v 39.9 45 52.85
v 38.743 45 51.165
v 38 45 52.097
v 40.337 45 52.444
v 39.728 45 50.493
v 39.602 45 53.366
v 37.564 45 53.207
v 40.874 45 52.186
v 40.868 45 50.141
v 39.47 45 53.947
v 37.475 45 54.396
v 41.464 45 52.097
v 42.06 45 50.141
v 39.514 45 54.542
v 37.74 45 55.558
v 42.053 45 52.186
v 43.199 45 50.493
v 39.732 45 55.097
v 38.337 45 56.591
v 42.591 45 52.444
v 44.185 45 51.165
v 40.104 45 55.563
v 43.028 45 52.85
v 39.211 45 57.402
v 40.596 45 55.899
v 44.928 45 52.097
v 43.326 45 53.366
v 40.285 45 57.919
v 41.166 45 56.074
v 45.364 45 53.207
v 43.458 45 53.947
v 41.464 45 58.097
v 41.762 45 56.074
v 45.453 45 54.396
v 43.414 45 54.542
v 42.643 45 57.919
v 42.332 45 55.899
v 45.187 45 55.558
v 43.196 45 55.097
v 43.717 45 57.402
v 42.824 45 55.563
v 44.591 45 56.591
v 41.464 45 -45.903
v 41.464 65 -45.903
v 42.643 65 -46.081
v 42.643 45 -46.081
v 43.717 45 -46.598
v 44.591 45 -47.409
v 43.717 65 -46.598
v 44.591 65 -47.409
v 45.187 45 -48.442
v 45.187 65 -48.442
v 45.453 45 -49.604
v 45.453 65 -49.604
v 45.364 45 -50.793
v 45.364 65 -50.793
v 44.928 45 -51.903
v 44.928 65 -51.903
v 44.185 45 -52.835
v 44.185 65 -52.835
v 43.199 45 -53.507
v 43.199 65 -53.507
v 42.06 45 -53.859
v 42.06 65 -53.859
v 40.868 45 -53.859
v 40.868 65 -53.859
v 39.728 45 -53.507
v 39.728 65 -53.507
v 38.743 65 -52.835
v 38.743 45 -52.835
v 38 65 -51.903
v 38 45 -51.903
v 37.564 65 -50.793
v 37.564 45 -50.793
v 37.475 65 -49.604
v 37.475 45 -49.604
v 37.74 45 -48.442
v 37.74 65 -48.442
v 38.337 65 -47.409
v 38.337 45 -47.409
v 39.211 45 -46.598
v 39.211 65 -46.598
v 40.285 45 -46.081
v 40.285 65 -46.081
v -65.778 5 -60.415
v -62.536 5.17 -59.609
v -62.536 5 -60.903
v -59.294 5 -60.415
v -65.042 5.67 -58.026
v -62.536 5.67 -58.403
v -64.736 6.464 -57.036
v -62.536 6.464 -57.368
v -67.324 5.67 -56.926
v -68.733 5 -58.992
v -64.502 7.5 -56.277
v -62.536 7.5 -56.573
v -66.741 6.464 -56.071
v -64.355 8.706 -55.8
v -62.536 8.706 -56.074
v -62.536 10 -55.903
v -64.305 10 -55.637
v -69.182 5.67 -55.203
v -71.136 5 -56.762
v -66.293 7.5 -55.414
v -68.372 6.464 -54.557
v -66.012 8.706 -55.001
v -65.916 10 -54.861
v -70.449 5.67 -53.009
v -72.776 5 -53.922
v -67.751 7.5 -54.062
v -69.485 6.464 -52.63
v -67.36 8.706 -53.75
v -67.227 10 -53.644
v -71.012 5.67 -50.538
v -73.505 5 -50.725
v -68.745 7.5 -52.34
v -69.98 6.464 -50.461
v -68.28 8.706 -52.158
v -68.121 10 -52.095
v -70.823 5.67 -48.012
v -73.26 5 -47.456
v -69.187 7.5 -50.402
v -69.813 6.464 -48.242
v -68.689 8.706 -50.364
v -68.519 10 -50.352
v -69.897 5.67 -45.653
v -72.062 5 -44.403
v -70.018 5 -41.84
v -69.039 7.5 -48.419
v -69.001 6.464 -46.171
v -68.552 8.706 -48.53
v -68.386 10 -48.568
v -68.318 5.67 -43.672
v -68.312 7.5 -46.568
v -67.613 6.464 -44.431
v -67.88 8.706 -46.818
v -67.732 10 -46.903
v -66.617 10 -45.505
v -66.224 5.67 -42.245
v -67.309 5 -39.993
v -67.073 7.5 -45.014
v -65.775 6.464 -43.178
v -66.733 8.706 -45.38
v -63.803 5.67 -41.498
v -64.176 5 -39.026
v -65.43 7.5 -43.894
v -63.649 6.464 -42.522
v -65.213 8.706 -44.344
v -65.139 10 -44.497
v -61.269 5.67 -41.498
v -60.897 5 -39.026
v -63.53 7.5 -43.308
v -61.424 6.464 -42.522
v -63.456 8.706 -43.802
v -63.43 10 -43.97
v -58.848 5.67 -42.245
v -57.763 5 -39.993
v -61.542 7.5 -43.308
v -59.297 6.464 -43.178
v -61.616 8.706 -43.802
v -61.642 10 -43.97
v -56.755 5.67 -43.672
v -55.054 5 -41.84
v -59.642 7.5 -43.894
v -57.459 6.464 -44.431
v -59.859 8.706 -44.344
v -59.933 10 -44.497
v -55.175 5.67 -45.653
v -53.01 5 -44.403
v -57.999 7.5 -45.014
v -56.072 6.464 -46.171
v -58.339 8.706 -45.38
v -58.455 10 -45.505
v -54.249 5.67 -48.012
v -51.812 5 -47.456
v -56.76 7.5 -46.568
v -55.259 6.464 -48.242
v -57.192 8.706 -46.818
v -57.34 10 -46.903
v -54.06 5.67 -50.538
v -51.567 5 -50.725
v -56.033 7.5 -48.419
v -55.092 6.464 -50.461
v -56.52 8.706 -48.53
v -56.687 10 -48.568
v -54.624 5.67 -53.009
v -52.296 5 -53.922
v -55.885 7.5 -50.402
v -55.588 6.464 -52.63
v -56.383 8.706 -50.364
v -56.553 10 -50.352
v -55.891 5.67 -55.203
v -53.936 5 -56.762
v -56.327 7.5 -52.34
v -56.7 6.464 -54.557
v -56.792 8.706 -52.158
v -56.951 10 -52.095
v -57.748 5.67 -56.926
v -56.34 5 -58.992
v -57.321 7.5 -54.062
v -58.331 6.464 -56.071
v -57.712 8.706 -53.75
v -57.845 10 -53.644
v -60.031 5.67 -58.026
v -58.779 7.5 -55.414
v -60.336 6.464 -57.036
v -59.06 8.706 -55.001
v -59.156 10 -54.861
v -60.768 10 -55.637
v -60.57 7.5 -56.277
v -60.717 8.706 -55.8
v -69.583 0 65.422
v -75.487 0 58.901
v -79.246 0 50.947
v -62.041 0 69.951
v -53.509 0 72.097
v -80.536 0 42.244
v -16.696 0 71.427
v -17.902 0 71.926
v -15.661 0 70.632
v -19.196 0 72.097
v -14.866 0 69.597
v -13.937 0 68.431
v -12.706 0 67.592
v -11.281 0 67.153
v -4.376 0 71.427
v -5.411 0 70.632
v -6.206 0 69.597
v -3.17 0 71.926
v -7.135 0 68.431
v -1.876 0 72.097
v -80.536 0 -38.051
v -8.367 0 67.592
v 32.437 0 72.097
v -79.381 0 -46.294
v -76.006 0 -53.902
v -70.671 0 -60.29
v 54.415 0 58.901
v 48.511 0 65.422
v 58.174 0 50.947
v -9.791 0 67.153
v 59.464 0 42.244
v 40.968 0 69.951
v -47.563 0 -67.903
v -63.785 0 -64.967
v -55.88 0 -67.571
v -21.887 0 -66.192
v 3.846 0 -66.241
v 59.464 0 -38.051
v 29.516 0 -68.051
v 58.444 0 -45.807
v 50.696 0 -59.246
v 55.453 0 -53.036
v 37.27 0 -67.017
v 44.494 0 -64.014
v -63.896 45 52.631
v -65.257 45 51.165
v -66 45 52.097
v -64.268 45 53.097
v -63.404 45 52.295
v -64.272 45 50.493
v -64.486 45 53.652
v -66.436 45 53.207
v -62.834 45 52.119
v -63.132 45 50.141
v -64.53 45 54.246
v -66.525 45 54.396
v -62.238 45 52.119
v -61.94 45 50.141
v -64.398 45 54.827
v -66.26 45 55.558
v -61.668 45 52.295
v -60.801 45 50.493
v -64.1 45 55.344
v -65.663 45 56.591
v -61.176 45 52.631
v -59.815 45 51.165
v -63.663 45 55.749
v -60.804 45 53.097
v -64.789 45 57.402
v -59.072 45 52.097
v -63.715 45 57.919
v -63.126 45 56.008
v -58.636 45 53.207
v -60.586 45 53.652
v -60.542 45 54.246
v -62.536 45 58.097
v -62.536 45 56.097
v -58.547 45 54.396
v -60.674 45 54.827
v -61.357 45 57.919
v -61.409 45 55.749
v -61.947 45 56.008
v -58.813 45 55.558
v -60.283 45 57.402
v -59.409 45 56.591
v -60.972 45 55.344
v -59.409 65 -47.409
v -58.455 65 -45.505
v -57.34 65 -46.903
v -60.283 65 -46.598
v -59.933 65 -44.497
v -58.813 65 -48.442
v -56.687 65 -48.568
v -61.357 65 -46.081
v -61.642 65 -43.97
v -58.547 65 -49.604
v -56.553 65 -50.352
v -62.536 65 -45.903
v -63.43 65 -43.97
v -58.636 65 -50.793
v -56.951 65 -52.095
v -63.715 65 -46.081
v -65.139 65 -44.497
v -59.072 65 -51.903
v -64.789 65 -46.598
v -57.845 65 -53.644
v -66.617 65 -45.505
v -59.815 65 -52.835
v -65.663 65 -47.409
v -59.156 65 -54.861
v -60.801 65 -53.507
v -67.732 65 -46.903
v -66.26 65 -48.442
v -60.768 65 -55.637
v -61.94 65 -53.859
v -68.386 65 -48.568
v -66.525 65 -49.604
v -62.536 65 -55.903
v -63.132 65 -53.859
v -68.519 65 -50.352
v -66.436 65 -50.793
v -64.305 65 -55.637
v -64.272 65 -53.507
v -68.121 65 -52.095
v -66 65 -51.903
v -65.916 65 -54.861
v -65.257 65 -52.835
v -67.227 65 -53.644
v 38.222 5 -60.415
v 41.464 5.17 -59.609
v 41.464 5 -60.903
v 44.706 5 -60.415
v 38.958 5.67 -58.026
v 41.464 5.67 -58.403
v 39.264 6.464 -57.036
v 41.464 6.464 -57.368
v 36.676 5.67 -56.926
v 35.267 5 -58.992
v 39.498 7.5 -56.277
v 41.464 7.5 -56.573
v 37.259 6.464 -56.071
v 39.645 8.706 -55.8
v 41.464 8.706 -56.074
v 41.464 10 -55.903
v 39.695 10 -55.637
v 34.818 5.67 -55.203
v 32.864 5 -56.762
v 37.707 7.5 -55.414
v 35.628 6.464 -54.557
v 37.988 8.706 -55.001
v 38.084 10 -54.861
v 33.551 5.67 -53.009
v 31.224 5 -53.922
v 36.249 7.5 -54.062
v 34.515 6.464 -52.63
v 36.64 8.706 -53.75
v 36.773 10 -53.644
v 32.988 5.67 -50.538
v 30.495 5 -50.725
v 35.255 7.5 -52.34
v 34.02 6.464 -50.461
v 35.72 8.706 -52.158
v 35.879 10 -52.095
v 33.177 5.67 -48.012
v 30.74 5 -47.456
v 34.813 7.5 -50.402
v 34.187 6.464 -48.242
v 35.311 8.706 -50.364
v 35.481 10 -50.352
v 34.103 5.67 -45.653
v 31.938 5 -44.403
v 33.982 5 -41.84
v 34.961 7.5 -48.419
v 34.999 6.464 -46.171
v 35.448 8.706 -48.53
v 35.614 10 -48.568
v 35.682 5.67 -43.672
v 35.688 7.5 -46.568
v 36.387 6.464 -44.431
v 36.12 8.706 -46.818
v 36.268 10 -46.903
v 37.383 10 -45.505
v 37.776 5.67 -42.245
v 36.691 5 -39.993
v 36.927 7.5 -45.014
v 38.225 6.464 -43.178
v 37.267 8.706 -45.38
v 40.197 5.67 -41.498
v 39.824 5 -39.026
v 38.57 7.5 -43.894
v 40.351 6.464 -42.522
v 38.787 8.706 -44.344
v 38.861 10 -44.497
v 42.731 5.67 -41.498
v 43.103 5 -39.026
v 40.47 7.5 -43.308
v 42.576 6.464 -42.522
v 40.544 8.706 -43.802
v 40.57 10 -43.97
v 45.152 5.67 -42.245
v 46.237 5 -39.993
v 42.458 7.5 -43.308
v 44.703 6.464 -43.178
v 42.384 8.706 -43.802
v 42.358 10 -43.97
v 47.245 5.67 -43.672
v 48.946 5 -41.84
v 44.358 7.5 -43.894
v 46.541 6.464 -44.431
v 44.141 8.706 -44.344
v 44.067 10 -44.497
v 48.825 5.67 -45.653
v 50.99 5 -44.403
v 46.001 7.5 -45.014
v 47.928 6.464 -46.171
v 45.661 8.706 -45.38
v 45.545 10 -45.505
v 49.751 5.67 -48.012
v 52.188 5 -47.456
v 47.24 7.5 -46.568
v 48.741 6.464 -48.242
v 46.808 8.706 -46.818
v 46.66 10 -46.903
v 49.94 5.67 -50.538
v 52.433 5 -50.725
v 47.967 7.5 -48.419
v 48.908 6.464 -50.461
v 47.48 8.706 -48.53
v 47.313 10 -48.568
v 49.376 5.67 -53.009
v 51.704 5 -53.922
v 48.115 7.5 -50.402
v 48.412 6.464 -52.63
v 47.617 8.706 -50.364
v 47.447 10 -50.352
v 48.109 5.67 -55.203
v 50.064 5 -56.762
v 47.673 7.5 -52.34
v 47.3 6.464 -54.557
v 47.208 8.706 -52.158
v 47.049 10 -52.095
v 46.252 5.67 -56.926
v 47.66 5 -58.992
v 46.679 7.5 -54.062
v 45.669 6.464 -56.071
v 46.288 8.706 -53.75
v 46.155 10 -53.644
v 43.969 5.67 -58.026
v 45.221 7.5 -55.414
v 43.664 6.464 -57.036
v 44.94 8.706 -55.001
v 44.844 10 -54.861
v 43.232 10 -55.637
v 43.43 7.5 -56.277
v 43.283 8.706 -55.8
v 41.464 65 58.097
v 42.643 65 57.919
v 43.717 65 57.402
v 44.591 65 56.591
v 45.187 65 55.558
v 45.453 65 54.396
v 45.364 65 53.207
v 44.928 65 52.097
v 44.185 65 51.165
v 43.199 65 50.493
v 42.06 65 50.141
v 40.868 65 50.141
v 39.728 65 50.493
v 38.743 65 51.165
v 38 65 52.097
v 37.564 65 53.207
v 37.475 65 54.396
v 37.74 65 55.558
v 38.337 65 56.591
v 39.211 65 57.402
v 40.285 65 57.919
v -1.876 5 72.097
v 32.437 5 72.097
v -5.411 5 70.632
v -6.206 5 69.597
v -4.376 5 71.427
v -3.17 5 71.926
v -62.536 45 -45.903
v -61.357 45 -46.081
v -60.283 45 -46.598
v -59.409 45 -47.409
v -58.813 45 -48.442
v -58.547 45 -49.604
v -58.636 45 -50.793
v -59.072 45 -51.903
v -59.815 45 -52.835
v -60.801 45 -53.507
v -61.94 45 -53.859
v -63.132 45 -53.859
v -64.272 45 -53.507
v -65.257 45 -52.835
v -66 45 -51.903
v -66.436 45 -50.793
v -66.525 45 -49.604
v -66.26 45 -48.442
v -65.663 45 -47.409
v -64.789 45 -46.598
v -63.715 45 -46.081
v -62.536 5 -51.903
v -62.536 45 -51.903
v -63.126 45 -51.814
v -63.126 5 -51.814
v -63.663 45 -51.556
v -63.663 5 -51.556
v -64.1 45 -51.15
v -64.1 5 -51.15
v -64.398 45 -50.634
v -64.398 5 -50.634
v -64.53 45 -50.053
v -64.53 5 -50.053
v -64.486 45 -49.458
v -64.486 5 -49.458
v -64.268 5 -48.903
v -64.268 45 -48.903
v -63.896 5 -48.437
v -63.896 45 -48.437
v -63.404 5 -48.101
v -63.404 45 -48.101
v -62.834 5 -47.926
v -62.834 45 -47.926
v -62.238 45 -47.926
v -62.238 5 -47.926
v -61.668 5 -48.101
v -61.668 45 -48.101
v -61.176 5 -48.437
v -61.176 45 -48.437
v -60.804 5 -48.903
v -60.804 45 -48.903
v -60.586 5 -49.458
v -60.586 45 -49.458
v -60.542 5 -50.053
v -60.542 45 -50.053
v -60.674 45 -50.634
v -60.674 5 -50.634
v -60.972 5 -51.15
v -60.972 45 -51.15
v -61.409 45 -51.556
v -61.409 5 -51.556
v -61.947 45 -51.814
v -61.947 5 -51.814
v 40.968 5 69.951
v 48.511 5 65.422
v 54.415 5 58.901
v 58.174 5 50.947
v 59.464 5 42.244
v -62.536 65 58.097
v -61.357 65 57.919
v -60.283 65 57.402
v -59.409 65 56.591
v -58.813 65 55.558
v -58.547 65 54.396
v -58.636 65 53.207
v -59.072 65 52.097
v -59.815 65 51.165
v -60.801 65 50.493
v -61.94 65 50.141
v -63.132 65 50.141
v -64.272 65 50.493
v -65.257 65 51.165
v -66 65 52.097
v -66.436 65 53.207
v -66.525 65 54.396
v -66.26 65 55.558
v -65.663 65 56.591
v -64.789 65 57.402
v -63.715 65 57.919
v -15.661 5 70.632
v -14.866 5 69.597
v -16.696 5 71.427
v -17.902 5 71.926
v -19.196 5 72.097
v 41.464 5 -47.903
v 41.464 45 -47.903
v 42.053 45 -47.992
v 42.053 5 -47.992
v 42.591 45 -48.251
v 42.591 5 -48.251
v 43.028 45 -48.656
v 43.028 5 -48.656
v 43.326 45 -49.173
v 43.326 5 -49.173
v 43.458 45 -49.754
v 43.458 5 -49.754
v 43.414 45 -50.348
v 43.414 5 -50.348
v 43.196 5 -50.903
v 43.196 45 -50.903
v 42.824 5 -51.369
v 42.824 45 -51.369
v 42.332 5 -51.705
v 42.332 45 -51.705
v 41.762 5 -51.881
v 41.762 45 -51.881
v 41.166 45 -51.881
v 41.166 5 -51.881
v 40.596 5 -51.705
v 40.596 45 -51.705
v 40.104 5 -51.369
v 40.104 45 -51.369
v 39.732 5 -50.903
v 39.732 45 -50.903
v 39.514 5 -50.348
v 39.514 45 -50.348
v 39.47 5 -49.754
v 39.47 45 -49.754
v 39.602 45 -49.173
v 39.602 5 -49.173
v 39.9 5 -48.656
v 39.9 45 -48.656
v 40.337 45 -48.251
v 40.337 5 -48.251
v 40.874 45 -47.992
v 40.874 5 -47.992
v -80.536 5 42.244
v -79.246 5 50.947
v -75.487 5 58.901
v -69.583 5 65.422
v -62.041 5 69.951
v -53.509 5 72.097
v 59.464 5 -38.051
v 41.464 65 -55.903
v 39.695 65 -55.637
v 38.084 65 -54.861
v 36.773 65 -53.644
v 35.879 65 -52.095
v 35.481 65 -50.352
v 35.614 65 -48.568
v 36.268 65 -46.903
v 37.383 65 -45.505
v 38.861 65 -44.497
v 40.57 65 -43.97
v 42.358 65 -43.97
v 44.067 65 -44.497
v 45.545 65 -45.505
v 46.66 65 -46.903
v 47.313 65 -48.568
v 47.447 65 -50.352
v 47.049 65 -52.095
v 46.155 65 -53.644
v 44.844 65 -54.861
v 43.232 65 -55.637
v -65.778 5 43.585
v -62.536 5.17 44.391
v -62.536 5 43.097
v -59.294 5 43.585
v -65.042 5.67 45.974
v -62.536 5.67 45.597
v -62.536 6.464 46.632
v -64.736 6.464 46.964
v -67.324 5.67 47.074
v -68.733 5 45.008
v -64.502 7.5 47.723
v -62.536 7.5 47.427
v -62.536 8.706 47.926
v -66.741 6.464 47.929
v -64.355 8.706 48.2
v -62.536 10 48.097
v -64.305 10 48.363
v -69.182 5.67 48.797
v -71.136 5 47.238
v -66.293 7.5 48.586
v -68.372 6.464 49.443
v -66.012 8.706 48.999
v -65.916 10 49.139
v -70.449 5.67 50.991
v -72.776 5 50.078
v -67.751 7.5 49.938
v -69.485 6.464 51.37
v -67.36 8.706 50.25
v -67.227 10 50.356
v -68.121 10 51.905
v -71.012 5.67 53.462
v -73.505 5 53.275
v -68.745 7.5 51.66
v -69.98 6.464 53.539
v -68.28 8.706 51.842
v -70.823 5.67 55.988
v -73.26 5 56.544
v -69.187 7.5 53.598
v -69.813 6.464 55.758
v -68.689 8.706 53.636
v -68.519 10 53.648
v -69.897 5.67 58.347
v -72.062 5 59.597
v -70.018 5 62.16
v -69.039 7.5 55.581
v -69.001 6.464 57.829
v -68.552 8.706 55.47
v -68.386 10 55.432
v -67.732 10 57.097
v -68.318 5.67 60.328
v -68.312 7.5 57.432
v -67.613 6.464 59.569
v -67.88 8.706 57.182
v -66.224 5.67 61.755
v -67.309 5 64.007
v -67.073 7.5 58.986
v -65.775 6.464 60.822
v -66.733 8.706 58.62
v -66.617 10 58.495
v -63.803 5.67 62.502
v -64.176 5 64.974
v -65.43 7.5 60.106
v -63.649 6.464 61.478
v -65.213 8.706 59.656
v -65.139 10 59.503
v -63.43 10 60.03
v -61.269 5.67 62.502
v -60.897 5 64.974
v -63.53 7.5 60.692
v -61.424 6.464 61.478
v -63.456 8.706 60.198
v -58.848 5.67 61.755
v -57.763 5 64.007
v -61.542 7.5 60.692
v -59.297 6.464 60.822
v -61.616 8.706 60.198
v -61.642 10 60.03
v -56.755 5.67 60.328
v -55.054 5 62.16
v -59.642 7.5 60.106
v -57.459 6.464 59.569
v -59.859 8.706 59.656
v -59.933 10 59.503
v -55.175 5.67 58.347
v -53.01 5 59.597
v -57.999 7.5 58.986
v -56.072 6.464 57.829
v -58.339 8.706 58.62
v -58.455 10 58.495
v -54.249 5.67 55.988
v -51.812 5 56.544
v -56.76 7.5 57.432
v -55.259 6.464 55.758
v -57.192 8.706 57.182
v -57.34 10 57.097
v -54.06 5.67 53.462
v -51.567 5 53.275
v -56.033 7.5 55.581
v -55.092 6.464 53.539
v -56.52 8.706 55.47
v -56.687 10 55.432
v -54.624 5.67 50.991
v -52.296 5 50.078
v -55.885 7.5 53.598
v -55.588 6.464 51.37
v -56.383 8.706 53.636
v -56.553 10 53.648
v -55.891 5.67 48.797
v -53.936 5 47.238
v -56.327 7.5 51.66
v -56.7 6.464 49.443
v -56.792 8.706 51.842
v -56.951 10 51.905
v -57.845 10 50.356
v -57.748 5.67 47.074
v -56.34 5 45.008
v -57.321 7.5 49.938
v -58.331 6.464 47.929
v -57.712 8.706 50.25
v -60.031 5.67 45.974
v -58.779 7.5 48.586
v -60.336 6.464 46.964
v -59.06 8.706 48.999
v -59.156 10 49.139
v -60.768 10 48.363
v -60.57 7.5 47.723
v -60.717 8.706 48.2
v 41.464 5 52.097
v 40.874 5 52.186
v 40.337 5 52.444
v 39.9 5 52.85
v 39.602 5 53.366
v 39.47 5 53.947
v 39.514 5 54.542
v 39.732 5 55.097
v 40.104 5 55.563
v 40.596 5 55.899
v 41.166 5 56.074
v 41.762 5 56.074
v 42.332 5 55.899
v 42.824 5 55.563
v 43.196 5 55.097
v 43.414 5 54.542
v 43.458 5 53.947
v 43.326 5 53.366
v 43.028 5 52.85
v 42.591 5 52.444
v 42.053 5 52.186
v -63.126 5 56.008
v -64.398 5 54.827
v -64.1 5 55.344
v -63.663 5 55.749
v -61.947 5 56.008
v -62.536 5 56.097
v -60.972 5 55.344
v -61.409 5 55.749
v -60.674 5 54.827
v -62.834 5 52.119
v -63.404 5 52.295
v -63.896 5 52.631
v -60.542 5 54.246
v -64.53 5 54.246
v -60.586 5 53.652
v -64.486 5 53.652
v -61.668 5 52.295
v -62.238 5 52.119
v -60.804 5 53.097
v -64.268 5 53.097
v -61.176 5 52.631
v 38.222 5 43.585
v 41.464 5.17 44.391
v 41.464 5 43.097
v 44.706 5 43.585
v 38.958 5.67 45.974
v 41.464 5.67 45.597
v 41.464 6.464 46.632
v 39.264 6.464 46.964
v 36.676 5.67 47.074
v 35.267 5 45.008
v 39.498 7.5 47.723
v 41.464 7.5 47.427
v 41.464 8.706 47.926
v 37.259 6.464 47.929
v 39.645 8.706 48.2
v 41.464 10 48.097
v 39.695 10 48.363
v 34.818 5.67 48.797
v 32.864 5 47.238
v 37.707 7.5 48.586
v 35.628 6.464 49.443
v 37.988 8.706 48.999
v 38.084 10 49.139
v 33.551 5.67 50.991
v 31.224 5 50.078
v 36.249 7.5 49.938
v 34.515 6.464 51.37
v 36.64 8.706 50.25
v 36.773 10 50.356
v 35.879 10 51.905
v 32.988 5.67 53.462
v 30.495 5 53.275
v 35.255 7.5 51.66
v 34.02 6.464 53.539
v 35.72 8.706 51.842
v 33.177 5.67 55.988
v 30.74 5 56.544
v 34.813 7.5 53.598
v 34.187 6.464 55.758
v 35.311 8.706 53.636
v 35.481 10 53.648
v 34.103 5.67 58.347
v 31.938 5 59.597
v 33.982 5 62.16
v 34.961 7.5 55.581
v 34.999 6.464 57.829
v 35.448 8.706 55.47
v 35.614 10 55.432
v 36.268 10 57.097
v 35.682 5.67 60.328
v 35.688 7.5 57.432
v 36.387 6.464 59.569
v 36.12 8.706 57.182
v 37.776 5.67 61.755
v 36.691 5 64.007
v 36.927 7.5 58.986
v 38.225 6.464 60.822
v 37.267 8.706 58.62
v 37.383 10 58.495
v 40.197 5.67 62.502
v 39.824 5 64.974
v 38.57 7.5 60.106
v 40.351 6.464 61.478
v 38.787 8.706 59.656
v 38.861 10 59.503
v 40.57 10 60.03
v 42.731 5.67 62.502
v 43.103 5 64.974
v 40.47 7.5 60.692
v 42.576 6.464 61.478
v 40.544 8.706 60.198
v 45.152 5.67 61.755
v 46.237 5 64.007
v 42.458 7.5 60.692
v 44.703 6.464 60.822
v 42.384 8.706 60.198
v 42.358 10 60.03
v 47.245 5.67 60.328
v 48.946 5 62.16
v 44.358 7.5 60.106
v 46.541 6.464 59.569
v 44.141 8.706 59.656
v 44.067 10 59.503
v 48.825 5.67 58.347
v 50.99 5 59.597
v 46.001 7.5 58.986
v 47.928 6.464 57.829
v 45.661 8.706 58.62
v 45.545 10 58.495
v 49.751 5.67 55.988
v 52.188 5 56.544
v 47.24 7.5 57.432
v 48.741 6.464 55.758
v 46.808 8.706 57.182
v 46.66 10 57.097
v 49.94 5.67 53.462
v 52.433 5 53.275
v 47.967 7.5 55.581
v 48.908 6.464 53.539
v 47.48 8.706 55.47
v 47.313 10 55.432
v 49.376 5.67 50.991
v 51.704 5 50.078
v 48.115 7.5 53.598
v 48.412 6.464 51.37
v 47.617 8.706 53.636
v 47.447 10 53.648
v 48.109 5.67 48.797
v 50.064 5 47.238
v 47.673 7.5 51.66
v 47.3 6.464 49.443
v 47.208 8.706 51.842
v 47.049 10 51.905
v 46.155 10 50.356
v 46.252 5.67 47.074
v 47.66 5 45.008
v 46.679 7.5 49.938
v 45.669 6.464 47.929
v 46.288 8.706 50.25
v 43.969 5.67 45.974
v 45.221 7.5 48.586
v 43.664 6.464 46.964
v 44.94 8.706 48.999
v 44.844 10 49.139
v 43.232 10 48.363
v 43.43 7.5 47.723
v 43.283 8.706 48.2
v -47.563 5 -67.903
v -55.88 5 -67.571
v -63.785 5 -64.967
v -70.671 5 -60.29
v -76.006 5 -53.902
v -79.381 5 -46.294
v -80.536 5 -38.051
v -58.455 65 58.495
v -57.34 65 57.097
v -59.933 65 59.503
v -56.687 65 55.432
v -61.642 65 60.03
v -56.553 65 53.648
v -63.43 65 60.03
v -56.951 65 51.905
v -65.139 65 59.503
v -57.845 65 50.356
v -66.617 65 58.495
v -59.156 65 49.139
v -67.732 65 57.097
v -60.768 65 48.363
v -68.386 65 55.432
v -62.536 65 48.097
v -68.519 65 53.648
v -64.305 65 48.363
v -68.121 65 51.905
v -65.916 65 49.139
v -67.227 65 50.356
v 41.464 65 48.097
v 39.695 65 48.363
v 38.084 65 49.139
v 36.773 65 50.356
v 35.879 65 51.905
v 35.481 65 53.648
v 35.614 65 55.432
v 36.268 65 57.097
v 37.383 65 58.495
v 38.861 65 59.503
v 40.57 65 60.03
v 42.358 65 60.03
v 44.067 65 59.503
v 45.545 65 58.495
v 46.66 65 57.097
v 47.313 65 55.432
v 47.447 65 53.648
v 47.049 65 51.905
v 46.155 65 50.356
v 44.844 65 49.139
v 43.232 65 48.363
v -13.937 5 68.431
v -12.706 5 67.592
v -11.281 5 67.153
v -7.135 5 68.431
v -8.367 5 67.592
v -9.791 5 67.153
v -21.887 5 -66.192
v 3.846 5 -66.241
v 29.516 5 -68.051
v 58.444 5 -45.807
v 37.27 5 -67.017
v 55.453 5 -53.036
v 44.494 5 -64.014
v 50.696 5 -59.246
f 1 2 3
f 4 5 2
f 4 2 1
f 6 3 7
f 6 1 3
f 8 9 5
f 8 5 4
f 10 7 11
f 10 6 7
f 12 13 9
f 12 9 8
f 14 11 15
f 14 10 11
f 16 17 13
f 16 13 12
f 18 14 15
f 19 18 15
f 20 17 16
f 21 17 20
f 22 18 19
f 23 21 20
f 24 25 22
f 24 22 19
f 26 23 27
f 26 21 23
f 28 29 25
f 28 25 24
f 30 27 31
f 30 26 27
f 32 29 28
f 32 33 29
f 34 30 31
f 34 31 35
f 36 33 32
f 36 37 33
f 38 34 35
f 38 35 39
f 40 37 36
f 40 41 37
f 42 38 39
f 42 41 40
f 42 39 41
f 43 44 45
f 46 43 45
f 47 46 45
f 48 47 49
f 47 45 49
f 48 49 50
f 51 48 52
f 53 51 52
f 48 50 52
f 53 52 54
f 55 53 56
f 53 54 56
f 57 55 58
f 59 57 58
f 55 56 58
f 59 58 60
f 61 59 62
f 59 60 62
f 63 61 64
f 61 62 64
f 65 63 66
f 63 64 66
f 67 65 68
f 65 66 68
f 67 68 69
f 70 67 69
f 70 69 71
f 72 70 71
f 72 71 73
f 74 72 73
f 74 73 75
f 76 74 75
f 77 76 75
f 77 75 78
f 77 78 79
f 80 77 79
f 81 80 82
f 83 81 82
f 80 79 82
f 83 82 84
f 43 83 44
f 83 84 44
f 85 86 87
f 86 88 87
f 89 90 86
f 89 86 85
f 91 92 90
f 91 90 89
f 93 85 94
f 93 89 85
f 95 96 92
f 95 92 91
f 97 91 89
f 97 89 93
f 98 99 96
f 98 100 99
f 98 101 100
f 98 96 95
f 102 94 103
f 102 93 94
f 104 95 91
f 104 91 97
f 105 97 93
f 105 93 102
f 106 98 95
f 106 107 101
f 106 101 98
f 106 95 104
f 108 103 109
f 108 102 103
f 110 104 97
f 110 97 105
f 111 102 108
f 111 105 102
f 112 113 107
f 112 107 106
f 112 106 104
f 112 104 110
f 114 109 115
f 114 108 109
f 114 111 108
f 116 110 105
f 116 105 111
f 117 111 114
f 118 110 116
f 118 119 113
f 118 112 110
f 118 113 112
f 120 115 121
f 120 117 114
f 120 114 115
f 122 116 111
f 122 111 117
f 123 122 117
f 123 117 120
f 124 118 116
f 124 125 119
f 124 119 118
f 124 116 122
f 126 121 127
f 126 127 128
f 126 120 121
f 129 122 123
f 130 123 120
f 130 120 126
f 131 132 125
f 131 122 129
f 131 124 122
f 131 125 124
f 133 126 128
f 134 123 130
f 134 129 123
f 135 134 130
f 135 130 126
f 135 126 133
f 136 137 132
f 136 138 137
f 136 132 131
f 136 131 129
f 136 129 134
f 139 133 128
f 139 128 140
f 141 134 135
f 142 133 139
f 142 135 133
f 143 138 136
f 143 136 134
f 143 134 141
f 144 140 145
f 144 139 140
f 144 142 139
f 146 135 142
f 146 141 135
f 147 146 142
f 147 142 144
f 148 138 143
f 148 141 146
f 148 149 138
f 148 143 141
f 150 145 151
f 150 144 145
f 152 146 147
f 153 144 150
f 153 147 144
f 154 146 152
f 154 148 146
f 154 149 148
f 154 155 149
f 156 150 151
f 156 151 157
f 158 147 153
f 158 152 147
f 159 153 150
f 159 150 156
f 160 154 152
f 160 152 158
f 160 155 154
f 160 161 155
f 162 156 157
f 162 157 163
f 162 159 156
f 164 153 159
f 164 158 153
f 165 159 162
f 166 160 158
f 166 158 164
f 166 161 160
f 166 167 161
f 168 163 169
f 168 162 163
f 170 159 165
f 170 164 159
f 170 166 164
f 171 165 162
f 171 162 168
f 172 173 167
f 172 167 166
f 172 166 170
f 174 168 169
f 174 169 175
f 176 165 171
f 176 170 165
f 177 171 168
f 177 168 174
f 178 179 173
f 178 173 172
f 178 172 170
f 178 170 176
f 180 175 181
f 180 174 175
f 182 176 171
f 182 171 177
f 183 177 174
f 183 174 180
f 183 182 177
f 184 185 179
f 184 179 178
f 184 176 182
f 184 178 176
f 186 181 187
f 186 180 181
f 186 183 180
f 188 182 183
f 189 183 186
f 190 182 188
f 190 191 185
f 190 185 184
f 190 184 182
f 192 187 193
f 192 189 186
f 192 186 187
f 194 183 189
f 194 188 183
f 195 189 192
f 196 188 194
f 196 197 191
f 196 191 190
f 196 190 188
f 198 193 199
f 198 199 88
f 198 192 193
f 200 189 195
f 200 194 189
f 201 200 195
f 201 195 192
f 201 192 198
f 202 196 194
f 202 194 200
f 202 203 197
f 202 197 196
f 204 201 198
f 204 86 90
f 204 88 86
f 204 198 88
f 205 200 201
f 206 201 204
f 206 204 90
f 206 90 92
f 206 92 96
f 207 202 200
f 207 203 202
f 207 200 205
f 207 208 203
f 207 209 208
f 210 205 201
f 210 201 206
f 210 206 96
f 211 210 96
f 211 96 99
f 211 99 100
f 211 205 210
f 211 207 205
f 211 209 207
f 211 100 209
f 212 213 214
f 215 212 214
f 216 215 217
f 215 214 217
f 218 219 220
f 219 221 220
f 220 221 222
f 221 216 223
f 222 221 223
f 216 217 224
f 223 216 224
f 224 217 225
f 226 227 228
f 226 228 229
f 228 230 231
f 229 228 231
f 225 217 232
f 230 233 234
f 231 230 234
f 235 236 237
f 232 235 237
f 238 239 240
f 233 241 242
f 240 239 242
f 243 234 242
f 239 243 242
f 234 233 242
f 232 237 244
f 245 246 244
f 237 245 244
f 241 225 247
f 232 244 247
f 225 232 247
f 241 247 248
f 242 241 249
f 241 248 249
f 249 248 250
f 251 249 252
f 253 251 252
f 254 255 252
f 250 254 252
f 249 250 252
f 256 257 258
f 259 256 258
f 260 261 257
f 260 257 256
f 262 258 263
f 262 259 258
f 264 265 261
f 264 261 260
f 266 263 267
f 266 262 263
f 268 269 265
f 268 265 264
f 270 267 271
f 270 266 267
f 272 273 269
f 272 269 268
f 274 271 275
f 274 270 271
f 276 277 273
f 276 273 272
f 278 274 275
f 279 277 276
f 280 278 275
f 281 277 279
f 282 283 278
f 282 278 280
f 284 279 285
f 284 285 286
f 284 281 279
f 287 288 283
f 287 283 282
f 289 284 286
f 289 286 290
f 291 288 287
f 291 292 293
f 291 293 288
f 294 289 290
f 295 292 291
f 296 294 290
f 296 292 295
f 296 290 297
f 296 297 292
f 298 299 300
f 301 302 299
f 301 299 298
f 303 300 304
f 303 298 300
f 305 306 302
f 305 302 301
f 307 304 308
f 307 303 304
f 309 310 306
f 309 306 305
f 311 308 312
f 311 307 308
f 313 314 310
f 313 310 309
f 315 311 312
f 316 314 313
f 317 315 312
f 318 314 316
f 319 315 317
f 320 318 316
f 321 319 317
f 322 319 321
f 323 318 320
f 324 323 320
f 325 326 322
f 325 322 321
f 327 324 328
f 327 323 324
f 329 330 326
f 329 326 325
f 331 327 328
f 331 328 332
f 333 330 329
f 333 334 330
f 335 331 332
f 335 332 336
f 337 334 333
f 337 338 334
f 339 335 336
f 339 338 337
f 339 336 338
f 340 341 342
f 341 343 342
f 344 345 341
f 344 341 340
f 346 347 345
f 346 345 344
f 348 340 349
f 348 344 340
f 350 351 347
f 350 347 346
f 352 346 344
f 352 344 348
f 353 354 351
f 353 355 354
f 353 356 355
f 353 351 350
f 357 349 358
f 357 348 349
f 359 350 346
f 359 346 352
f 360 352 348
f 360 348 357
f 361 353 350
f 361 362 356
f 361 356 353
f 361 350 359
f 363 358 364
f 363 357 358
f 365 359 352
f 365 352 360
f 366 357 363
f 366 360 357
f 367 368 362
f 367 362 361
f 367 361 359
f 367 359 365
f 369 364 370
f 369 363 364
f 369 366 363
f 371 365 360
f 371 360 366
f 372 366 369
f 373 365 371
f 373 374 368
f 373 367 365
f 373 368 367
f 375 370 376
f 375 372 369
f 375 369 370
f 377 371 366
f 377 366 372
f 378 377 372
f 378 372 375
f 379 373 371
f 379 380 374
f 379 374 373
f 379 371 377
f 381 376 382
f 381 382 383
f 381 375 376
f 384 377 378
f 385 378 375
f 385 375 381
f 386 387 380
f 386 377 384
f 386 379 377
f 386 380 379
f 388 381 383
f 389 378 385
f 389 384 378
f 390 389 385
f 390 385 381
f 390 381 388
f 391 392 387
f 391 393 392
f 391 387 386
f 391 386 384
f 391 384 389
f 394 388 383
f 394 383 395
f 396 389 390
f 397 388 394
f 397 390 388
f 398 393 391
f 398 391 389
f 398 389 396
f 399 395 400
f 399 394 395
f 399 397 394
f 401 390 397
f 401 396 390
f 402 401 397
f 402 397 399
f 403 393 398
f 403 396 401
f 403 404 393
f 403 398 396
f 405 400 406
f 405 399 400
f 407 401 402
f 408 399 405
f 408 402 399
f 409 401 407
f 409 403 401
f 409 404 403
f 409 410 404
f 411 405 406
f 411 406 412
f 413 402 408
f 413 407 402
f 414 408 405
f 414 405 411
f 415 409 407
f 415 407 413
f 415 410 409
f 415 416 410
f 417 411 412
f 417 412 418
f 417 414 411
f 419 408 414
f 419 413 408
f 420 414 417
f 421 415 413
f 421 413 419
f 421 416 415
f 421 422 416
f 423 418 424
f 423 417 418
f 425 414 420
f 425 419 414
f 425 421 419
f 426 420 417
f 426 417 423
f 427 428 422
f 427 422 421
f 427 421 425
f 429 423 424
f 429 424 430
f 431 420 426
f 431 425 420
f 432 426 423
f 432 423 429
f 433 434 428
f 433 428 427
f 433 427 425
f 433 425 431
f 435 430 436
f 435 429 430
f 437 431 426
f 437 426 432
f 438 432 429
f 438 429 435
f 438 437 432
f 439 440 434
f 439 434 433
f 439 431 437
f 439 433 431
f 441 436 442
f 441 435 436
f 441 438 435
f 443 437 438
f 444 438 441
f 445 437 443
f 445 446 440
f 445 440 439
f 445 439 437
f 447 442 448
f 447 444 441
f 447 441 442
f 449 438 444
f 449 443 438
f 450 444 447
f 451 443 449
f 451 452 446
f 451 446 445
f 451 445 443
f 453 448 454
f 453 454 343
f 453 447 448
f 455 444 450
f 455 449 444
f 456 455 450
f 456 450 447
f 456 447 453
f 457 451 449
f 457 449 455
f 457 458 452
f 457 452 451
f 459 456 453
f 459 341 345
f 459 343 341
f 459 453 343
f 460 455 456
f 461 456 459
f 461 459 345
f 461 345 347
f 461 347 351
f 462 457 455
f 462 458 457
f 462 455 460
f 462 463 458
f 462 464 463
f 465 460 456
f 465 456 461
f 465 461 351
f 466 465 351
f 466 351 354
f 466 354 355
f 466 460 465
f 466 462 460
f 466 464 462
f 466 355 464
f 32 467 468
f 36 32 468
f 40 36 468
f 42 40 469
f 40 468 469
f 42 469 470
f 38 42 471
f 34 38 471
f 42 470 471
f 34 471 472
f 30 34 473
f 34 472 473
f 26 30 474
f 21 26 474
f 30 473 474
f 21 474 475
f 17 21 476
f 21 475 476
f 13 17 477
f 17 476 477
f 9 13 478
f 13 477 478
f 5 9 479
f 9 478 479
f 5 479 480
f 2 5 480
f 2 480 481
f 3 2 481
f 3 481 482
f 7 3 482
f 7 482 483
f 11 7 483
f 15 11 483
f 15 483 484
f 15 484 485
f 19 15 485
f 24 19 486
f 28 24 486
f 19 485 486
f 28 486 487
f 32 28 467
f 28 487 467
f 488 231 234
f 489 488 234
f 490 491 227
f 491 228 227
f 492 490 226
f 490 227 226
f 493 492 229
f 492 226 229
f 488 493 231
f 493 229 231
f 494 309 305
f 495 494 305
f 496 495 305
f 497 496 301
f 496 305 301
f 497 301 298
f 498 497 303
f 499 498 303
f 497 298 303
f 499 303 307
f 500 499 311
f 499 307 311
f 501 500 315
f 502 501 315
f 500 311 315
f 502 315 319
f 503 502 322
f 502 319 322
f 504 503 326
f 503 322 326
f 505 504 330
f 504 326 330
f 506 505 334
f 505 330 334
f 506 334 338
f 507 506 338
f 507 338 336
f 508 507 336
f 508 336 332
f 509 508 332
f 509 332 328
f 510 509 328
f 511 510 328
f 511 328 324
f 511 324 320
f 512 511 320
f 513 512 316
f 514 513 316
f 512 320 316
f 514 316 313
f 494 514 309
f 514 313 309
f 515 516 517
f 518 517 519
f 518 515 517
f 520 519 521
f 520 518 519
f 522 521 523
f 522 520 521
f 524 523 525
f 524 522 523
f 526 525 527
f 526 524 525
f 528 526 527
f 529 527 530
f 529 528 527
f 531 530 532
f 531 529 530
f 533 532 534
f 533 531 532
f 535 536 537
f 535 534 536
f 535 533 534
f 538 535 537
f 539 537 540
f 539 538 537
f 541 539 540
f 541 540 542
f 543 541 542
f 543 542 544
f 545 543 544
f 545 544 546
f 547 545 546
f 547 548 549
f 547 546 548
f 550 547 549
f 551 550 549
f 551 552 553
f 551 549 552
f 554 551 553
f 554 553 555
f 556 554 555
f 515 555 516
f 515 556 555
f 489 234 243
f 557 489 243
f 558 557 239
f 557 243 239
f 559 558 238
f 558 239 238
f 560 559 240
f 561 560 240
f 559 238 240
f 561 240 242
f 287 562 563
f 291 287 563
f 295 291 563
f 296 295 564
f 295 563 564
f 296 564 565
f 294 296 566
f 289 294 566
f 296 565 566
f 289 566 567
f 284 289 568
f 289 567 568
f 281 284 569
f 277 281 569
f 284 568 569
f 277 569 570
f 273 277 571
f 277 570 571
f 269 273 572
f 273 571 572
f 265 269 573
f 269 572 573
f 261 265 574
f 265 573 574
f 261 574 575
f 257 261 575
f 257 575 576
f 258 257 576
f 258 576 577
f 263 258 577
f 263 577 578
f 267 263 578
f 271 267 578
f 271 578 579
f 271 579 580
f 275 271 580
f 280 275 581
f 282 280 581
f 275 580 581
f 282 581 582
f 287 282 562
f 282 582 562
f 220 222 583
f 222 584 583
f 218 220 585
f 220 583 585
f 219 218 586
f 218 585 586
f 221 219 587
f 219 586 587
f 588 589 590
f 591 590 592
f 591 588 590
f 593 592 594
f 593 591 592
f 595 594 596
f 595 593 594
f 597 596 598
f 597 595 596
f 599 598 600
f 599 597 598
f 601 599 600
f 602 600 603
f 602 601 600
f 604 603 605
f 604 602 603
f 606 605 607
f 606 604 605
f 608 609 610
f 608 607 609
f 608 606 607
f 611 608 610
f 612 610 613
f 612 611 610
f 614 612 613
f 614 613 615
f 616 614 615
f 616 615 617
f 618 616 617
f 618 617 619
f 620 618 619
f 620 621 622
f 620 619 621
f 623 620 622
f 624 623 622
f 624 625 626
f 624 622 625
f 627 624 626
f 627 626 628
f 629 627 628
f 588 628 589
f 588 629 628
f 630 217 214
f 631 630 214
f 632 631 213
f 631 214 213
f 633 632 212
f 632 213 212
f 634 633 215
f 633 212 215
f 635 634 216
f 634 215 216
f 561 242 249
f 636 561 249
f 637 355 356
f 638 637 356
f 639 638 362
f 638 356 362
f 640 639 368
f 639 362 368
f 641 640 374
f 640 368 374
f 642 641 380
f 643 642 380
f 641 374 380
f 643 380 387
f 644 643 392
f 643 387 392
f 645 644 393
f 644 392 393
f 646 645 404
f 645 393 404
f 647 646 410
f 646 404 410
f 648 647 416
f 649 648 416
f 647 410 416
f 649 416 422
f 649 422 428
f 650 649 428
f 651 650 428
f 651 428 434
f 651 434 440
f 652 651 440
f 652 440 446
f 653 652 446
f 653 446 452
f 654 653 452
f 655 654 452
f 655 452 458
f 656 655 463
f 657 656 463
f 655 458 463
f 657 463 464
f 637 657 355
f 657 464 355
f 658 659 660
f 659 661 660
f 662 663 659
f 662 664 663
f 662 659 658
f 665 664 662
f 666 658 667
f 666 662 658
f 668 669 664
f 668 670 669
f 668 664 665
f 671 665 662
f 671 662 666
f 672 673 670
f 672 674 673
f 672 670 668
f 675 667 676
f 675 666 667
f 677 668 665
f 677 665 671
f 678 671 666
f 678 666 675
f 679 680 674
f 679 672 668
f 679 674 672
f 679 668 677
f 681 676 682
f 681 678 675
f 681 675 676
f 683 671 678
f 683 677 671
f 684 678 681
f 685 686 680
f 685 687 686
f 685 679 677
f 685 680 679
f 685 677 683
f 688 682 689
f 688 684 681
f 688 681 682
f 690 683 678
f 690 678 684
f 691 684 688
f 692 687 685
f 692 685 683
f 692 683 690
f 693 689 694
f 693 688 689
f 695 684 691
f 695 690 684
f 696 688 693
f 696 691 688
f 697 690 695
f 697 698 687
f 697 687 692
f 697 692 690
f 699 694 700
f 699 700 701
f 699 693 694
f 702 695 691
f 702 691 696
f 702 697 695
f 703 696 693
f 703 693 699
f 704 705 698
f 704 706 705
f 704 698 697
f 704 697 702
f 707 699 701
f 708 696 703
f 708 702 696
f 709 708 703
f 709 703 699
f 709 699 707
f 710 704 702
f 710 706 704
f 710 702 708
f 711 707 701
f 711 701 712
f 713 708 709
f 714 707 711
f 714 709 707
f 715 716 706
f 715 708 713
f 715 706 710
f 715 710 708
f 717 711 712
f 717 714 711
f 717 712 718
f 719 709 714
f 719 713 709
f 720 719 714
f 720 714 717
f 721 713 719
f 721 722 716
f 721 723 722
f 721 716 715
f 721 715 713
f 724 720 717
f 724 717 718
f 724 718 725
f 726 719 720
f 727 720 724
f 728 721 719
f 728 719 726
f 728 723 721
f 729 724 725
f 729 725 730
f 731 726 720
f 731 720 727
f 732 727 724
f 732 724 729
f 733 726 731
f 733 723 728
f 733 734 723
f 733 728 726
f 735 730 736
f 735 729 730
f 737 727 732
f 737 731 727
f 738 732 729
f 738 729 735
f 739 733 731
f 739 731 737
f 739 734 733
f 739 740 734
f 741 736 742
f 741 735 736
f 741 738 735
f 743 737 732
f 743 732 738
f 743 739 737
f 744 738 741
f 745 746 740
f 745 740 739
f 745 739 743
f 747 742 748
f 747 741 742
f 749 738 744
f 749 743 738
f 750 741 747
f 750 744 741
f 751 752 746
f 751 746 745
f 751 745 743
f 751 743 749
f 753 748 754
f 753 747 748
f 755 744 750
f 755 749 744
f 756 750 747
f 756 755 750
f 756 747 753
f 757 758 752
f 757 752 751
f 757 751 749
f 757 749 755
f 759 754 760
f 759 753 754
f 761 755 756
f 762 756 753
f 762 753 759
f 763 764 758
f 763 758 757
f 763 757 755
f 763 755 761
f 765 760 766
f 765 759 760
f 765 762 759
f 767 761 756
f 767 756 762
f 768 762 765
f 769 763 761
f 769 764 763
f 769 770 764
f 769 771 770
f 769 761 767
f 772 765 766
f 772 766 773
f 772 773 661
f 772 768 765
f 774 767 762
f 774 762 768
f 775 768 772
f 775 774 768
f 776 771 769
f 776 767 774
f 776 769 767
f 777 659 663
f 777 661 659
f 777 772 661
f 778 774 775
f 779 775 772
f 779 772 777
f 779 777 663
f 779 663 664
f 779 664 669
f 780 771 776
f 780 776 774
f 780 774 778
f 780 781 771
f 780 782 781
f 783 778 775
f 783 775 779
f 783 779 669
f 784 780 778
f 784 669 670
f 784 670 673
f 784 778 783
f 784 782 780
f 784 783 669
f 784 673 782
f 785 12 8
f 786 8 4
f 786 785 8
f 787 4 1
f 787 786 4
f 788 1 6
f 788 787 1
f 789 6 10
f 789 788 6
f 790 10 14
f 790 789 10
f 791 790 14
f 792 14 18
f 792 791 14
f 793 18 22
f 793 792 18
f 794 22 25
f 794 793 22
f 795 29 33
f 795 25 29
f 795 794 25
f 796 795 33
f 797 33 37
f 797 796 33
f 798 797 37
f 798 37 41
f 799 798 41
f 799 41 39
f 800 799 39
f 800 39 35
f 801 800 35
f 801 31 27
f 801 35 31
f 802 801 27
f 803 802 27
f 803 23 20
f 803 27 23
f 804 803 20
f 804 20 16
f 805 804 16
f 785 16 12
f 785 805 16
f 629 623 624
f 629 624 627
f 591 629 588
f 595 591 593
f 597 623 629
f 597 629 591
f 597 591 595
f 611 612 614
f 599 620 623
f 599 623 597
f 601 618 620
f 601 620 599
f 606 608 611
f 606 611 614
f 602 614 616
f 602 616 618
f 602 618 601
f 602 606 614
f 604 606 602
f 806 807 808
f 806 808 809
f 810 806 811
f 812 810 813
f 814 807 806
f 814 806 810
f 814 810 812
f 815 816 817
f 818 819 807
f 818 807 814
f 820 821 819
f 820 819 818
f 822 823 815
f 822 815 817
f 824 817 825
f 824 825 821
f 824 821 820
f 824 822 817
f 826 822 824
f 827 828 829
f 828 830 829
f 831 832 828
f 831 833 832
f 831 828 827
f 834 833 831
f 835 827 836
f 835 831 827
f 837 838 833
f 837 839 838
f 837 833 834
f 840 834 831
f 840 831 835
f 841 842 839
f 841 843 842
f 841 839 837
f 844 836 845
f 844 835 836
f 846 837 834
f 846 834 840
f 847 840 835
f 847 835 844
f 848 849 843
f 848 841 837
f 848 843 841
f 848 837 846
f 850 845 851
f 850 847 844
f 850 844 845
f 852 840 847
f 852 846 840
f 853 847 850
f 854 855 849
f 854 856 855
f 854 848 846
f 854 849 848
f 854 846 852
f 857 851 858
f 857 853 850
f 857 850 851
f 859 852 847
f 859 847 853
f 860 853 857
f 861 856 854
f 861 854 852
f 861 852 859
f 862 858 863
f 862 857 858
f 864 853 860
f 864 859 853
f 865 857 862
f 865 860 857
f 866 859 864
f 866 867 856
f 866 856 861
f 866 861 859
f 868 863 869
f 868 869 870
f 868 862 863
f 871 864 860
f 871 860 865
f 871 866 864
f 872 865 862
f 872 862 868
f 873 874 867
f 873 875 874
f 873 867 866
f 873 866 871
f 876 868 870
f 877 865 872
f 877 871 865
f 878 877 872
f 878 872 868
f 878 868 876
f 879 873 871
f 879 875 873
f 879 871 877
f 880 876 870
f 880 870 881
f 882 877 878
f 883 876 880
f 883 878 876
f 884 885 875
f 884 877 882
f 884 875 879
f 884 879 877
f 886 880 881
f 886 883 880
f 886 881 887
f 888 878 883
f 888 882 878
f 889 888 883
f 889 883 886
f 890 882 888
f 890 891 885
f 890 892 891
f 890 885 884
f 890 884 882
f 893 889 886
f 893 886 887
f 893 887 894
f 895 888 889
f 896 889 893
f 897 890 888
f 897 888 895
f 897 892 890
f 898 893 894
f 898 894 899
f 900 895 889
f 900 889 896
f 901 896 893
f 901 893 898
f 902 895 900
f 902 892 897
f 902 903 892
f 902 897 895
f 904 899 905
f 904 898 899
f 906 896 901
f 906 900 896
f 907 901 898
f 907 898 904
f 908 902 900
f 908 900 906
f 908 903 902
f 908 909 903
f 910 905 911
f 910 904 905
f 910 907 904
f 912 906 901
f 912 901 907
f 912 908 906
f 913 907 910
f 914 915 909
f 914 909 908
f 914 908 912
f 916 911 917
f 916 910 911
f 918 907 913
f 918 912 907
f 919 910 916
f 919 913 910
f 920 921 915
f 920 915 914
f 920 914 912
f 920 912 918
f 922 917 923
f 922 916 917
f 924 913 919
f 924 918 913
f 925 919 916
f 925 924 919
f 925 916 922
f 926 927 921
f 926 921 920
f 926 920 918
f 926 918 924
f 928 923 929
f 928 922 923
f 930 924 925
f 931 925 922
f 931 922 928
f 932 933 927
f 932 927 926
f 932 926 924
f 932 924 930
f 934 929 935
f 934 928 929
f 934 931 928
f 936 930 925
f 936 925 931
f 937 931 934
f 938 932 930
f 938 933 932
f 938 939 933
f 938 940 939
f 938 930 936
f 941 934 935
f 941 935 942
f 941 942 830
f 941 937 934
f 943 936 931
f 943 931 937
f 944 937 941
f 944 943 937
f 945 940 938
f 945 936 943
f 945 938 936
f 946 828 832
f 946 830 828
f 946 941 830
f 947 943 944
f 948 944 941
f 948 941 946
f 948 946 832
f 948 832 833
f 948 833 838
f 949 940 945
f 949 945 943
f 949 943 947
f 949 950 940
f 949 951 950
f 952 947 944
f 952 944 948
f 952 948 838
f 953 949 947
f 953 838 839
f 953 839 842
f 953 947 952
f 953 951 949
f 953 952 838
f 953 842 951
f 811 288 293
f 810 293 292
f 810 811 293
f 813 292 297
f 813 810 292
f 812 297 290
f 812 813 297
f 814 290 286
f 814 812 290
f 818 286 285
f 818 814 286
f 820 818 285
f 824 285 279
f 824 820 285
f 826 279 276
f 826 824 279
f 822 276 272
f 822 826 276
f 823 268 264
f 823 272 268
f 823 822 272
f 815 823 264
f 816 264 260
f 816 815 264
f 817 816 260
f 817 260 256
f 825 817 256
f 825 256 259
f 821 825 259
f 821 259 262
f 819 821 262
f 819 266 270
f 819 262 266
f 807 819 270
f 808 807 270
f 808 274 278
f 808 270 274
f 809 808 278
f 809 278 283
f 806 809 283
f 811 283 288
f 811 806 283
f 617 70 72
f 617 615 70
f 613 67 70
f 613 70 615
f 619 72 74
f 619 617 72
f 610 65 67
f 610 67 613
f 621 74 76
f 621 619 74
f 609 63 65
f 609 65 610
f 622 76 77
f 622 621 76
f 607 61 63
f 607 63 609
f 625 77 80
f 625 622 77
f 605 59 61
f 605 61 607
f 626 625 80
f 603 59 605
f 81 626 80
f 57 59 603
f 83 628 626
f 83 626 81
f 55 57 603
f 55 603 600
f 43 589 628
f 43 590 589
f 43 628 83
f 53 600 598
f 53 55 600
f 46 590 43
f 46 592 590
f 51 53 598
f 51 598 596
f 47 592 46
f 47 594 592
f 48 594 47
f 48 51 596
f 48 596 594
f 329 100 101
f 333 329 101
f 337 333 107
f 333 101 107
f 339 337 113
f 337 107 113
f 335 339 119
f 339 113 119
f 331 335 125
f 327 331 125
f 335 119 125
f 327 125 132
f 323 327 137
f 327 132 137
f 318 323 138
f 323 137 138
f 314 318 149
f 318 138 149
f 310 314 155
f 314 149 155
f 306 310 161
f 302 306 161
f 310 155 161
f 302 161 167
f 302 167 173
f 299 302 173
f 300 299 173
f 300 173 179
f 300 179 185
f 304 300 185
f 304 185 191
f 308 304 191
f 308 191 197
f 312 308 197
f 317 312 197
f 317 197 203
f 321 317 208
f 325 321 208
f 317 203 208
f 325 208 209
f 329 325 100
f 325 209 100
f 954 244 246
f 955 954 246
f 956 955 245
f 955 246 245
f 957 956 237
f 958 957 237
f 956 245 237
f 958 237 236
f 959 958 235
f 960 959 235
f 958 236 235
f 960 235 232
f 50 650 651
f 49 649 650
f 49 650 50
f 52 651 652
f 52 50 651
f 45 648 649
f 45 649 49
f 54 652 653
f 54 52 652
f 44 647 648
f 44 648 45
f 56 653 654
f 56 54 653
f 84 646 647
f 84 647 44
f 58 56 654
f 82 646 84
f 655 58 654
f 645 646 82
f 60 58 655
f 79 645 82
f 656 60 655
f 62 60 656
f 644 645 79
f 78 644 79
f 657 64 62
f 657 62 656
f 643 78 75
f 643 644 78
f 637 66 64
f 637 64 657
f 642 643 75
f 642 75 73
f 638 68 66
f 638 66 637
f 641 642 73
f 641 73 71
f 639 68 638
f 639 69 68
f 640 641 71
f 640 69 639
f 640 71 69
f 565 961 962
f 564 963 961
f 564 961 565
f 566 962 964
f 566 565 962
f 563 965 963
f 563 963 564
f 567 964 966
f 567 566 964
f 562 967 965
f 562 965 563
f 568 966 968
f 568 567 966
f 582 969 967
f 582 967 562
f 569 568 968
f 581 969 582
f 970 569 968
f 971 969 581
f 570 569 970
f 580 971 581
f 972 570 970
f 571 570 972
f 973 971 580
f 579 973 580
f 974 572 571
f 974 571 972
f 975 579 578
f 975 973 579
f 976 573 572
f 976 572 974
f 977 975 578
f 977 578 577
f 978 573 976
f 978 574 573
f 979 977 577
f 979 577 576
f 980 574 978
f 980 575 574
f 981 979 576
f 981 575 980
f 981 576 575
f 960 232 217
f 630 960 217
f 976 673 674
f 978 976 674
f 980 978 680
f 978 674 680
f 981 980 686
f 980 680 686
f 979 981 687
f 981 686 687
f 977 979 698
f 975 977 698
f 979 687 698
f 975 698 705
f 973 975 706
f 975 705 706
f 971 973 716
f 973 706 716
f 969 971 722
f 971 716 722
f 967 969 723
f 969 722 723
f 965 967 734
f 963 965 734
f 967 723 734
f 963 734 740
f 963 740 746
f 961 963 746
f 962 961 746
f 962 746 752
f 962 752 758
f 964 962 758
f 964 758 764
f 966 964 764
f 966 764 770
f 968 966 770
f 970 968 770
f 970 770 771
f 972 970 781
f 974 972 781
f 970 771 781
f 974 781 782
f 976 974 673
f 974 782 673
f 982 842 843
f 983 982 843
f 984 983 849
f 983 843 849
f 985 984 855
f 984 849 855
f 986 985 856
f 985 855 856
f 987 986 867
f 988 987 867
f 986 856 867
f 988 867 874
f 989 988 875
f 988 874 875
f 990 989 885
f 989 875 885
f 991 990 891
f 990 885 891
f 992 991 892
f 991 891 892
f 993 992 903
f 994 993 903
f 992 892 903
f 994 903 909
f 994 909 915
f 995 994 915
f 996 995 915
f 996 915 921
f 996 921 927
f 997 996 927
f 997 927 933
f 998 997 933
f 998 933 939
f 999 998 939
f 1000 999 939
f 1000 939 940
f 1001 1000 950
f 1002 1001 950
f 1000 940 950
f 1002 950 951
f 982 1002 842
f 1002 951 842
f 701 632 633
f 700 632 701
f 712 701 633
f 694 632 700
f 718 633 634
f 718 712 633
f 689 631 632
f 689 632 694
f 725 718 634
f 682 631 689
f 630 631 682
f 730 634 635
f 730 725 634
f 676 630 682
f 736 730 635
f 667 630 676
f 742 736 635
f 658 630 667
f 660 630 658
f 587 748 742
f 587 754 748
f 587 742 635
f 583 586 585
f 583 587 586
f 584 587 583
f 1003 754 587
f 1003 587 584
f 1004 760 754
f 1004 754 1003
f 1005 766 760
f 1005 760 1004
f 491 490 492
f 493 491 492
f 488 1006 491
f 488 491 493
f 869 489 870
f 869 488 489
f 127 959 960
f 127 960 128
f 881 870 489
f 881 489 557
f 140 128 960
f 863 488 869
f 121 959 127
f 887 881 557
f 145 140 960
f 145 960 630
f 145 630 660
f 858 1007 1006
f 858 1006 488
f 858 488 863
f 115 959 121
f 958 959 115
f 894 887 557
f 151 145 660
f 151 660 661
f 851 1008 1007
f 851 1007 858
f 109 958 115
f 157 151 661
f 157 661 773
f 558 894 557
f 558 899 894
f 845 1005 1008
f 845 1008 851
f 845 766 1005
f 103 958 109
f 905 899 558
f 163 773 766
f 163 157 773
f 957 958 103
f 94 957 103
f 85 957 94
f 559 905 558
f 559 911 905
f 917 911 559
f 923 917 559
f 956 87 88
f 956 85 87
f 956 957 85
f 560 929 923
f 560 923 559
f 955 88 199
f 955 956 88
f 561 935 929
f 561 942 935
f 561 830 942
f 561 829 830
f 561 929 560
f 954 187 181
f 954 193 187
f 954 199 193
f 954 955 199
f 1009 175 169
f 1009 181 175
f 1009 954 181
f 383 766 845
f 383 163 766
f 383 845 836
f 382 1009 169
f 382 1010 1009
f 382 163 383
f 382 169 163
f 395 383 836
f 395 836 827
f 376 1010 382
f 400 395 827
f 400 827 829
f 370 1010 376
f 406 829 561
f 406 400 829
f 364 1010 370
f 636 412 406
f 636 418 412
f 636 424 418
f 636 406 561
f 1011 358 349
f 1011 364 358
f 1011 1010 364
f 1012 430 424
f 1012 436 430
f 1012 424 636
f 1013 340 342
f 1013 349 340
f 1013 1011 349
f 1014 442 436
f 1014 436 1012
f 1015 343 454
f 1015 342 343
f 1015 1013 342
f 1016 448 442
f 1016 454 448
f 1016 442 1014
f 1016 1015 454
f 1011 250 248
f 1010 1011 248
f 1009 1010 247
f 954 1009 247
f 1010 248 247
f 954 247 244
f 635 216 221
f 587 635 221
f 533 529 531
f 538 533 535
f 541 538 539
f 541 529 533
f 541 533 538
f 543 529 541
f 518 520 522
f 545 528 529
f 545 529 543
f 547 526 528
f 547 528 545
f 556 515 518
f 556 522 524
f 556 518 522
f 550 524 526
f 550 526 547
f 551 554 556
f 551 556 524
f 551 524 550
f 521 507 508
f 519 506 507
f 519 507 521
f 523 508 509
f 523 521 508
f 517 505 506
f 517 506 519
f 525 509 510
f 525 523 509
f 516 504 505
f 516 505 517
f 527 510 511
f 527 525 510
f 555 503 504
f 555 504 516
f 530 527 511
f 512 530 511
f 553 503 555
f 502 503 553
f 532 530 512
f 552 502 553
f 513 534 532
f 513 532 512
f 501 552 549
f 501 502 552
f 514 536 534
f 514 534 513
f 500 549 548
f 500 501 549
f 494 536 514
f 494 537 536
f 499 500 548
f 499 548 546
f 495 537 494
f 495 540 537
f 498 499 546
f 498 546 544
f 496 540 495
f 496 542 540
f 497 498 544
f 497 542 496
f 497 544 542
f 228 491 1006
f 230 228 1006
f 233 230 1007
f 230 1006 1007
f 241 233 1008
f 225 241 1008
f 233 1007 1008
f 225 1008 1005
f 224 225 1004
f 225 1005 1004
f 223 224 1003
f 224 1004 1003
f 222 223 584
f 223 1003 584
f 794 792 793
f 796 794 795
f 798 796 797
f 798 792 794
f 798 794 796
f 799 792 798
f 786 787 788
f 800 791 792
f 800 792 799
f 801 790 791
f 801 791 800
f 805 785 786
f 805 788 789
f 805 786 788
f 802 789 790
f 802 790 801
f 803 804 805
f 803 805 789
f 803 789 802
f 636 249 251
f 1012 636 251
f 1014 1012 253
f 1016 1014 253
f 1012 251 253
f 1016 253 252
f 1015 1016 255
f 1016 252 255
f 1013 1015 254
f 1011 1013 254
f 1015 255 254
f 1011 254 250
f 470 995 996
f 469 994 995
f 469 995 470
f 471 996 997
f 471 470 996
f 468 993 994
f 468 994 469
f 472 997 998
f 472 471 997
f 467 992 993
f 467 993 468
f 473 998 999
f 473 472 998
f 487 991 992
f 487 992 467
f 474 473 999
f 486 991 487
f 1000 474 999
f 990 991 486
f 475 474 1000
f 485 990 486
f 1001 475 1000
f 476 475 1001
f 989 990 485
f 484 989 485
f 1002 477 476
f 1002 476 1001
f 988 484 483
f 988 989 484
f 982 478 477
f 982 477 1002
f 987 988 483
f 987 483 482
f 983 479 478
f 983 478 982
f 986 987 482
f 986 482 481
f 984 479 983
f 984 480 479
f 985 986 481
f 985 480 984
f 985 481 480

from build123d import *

# Parameters (mm, degrees)
BOSS_EXTRUDE1_DEPTH = 5
SKETCH3_R           = 6
SKETCH3_R_2         = 2
BOSS_EXTRUDE2_DEPTH = 60
SKETCH4_R           = 4
CUT_EXTRUDE2_DEPTH  = 20
FILLET1_R           = 5
SKETCH5_R           = 5
CUT_EXTRUDE3_DEPTH  = 10
FILLET2_R           = 5


with BuildPart() as part:
    # Sketch2 → Boss-Extrude1 (new body)
    with BuildSketch(Plane(origin=(0, 0, 0), x_dir=(1, 0, 0), z_dir=(0, 1, 0))):
        with BuildLine():
            Line((-53.508823352, -72.096737708), (32.436645713, -72.096737708))
            ThreePointArc((32.436645713, -72.096737708), (51.703313555, -62.379157363), (59.46391118, -42.24438689))
            Line((59.46391118, -42.24438689), (59.46391118, 38.050911473))
            ThreePointArc((59.46391118, 38.050911473), (50.695521882, 59.245691656), (29.51599738, 68.050866257))
            ThreePointArc((29.51599738, 68.050866257), (-9.019885151, 65.996186888), (-47.563354288, 67.903262292))
            ThreePointArc((-47.563354288, 67.903262292), (-70.670859293, 60.290313848), (-80.53608882, 38.050911473))
            Line((-80.53608882, 38.050911473), (-80.53608882, -42.24438689))
            ThreePointArc((-80.53608882, -42.24438689), (-72.775491194, -62.379157363), (-53.508823352, -72.096737708))
        make_face()
    extrude(amount=BOSS_EXTRUDE1_DEPTH)

    # Sketch3 → Boss-Extrude2 (add)
    # profile 1 of 4: a face of its own
    with BuildSketch(Plane(origin=(0, 5, 0), x_dir=(1, 0, 0), z_dir=(0, 1, 0))):
        with Locations(Location((41.46391118, 49.903262292, 0), (0, 0, 90))):
            Circle(SKETCH3_R)
        with Locations(Location((41.46391118, 49.903262292, 0), (0, 0, 270))):
            Circle(SKETCH3_R_2, mode=Mode.SUBTRACT)
    # profile 2 of 4: a face of its own
    with BuildSketch(Plane(origin=(0, 5, 0), x_dir=(1, 0, 0), z_dir=(0, 1, 0))):
        with Locations(Location((-62.53608882, 49.903262292, 0), (0, 0, 90))):
            Circle(SKETCH3_R)
        with Locations(Location((-62.53608882, 49.903262292, 0), (0, 0, 90))):
            Circle(SKETCH3_R_2, mode=Mode.SUBTRACT)
    # profile 3 of 4: a face of its own
    with BuildSketch(Plane(origin=(0, 5, 0), x_dir=(1, 0, 0), z_dir=(0, 1, 0))):
        with Locations(Location((-62.53608882, -54.096737708, 0), (0, 0, 90))):
            Circle(SKETCH3_R)
        with Locations(Location((-62.53608882, -54.096737708, 0), (0, 0, 270))):
            Circle(SKETCH3_R_2, mode=Mode.SUBTRACT)
    # profile 4 of 4: a face of its own
    with BuildSketch(Plane(origin=(0, 5, 0), x_dir=(1, 0, 0), z_dir=(0, 1, 0))):
        with Locations(Location((41.46391118, -54.096737708, 0), (0, 0, 90))):
            Circle(SKETCH3_R)
        with Locations(Location((41.46391118, -54.096737708, 0), (0, 0, 90))):
            Circle(SKETCH3_R_2, mode=Mode.SUBTRACT)
    extrude(amount=BOSS_EXTRUDE2_DEPTH)

    # Sketch4 → Cut-Extrude2 (cut)
    with BuildSketch(Plane(origin=(0, 65, 0), x_dir=(1, 0, 0), z_dir=(0, 1, 0))):
        with Locations(Location((41.46391118, 49.903262292, 0), (0, 0, 270))):
            Circle(SKETCH4_R)
        with Locations(Location((-62.53608882, 49.903262292, 0), (0, 0, 270))):
            Circle(SKETCH4_R)
        with Locations(Location((-62.53608882, -54.096737708, 0), (0, 0, 270))):
            Circle(SKETCH4_R)
        with Locations(Location((41.46391118, -54.096737708, 0), (0, 0, 270))):
            Circle(SKETCH4_R)
    extrude(amount=-CUT_EXTRUDE2_DEPTH, mode=Mode.SUBTRACT)

    # Fillet1
    fillet1_edges = [part.edges().sort_by_distance(p)[0] for p in [
        (41.46391118, 5, -43.903262292),
        (-62.53608882, 5, -43.903262292),
        (-62.53608882, 5, 60.096737708),
        (41.46391118, 5, 60.096737708),
    ]]
    fillet(fillet1_edges, radius=FILLET1_R)

    # Sketch5 → Cut-Extrude3 (cut)
    with BuildSketch(Plane(origin=(0, 5, 0), x_dir=(1, 0, 0), z_dir=(0, 1, 0))):
        with Locations((-10.53608882, -72.096737708)):
            Circle(SKETCH5_R)
    extrude(amount=-CUT_EXTRUDE3_DEPTH, mode=Mode.SUBTRACT)

    # Fillet2
    fillet2_edges = [part.edges().sort_by_distance(p)[0] for p in [
        (-15.53608882, 2.5, 72.096737708),
        (-5.53608882, 2.5, 72.096737708),
    ]]
    fillet(fillet2_edges, radius=FILLET2_R)


solid = part.part
